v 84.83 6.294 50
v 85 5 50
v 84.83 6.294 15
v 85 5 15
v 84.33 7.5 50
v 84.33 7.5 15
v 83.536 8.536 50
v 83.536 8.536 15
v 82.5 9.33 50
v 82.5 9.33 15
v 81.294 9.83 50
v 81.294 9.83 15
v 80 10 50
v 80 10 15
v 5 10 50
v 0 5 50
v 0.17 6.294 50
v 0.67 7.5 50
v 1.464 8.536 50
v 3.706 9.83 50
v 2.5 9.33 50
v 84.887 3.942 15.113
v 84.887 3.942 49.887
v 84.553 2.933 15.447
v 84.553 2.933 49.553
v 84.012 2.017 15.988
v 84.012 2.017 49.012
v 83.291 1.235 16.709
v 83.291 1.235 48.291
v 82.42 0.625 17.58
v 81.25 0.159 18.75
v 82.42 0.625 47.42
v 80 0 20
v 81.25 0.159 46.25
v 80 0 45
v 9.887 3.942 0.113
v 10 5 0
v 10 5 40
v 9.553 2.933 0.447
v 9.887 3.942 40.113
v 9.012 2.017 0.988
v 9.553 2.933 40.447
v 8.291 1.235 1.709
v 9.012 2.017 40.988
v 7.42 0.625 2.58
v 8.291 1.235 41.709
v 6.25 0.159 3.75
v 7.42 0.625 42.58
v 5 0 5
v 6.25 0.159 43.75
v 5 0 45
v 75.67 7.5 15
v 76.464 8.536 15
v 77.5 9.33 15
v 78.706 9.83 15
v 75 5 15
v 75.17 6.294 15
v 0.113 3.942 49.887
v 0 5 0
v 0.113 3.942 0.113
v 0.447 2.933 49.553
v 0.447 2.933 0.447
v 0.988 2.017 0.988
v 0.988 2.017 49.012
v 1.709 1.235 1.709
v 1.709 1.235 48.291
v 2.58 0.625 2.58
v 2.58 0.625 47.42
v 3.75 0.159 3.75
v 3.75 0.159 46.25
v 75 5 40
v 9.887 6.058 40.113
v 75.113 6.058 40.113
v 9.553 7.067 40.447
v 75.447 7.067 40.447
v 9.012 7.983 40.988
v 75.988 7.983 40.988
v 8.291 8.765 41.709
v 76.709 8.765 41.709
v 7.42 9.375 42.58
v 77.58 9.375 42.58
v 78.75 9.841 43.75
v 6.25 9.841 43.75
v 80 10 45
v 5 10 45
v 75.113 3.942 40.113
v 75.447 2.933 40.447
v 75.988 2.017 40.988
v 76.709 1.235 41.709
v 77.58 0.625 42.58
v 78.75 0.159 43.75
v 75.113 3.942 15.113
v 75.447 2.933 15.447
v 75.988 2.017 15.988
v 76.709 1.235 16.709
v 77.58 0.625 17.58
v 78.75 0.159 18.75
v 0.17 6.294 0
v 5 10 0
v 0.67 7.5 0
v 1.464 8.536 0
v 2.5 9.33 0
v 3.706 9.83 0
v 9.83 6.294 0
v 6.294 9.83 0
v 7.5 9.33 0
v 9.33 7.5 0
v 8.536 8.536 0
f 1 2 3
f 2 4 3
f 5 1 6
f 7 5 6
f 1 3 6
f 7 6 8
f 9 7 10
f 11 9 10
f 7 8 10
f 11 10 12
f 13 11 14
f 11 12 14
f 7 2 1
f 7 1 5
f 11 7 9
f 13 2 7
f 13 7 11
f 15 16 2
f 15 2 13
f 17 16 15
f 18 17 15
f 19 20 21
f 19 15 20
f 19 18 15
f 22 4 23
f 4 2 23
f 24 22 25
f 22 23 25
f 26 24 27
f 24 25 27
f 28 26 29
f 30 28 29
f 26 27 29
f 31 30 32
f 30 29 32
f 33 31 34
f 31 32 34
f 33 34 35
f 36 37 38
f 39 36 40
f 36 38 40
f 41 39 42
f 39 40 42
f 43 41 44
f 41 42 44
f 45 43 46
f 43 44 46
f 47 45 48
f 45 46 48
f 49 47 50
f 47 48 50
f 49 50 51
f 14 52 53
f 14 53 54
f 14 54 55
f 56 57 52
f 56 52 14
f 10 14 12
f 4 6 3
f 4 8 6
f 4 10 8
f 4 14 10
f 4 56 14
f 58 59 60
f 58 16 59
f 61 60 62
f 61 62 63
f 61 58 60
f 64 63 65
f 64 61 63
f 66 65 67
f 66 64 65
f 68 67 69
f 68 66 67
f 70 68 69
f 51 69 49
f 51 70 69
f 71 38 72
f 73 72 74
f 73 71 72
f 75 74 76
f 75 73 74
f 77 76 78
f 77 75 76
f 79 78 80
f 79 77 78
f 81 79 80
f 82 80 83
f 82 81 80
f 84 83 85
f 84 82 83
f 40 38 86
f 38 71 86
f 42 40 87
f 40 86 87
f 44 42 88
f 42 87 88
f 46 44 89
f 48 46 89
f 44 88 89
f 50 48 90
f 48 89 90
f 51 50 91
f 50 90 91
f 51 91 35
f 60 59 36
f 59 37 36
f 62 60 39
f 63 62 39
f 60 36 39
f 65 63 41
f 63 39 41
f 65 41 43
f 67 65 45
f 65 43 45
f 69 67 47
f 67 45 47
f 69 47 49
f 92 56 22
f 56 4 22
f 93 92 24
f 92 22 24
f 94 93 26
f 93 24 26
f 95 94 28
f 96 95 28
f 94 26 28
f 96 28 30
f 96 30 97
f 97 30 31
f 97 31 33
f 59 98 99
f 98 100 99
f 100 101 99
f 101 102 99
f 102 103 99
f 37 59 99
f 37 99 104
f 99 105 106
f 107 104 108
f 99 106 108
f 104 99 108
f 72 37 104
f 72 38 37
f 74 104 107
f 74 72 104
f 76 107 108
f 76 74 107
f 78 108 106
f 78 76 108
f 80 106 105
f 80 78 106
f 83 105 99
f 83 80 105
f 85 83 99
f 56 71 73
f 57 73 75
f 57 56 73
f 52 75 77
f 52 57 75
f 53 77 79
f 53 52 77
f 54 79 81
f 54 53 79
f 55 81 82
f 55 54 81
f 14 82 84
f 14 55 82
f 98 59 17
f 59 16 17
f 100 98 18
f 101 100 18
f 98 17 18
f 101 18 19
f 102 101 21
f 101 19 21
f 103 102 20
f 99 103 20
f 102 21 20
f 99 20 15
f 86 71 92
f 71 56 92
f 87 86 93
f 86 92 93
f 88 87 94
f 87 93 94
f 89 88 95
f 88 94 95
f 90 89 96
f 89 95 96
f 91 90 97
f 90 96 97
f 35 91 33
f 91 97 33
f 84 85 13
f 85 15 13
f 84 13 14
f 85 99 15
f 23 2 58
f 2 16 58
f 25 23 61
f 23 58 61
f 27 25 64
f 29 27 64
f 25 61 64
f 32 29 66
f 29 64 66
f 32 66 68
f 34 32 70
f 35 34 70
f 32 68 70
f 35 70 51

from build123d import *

# Parameters (mm, degrees)
F0_W     = 10
F0_H     = 10
F1_DEPTH = 50
F2_W     = 10
F2_H     = 10
F3_DEPTH = 75
F4_W     = 10
F4_H     = 10
F5_DEPTH = 25
F6_R     = 4.99999


# Not quite as in the source:
# - a fillet or chamfer is up to 0.001 mm smaller than in the source, because OpenCascade refuses the exact size


with BuildPart() as f1:
    # F0 (on Top) → F1 (new body)
    with BuildSketch(Plane.XY):
        with Locations((5, 5)):
            Rectangle(F0_W, F0_H)
    extrude(amount=F1_DEPTH)

    # F2 (on face) → F3 (join)
    with BuildSketch(Plane.YZ.offset(10)):
        with Locations((5, 45)):
            Rectangle(F2_W, F2_H)
    extrude(amount=F3_DEPTH)

    # F4 (on face) → F5 (join)
    with BuildSketch(Plane(origin=(0, 0, 40), x_dir=(1, 0, 0), z_dir=(0, 0, -1))):
        with Locations((80, -5)):
            Rectangle(F4_W, F4_H)
    extrude(amount=F5_DEPTH)

    # F6 (radius 5 in the source; OpenCascade refuses exactly that, so slightly less here)
    f6_edges = [f1.edges().sort_by_distance(p)[0] for p in [
        (10, 0, 20),
        (0, 0, 25),
        (0, 10, 25),
        (10, 10, 20),
        (42.5, 0, 50),
        (42.5, 0, 40),
        (42.5, 10, 40),
        (85, 0, 32.5),
        (80, 0, 15),
        (75, 0, 27.5),
        (5, 0, 0),
        (85, 10, 32.5),
        (75, 10, 27.5),
    ]]
    fillet(f6_edges, radius=F6_R)


solid = f1.part
